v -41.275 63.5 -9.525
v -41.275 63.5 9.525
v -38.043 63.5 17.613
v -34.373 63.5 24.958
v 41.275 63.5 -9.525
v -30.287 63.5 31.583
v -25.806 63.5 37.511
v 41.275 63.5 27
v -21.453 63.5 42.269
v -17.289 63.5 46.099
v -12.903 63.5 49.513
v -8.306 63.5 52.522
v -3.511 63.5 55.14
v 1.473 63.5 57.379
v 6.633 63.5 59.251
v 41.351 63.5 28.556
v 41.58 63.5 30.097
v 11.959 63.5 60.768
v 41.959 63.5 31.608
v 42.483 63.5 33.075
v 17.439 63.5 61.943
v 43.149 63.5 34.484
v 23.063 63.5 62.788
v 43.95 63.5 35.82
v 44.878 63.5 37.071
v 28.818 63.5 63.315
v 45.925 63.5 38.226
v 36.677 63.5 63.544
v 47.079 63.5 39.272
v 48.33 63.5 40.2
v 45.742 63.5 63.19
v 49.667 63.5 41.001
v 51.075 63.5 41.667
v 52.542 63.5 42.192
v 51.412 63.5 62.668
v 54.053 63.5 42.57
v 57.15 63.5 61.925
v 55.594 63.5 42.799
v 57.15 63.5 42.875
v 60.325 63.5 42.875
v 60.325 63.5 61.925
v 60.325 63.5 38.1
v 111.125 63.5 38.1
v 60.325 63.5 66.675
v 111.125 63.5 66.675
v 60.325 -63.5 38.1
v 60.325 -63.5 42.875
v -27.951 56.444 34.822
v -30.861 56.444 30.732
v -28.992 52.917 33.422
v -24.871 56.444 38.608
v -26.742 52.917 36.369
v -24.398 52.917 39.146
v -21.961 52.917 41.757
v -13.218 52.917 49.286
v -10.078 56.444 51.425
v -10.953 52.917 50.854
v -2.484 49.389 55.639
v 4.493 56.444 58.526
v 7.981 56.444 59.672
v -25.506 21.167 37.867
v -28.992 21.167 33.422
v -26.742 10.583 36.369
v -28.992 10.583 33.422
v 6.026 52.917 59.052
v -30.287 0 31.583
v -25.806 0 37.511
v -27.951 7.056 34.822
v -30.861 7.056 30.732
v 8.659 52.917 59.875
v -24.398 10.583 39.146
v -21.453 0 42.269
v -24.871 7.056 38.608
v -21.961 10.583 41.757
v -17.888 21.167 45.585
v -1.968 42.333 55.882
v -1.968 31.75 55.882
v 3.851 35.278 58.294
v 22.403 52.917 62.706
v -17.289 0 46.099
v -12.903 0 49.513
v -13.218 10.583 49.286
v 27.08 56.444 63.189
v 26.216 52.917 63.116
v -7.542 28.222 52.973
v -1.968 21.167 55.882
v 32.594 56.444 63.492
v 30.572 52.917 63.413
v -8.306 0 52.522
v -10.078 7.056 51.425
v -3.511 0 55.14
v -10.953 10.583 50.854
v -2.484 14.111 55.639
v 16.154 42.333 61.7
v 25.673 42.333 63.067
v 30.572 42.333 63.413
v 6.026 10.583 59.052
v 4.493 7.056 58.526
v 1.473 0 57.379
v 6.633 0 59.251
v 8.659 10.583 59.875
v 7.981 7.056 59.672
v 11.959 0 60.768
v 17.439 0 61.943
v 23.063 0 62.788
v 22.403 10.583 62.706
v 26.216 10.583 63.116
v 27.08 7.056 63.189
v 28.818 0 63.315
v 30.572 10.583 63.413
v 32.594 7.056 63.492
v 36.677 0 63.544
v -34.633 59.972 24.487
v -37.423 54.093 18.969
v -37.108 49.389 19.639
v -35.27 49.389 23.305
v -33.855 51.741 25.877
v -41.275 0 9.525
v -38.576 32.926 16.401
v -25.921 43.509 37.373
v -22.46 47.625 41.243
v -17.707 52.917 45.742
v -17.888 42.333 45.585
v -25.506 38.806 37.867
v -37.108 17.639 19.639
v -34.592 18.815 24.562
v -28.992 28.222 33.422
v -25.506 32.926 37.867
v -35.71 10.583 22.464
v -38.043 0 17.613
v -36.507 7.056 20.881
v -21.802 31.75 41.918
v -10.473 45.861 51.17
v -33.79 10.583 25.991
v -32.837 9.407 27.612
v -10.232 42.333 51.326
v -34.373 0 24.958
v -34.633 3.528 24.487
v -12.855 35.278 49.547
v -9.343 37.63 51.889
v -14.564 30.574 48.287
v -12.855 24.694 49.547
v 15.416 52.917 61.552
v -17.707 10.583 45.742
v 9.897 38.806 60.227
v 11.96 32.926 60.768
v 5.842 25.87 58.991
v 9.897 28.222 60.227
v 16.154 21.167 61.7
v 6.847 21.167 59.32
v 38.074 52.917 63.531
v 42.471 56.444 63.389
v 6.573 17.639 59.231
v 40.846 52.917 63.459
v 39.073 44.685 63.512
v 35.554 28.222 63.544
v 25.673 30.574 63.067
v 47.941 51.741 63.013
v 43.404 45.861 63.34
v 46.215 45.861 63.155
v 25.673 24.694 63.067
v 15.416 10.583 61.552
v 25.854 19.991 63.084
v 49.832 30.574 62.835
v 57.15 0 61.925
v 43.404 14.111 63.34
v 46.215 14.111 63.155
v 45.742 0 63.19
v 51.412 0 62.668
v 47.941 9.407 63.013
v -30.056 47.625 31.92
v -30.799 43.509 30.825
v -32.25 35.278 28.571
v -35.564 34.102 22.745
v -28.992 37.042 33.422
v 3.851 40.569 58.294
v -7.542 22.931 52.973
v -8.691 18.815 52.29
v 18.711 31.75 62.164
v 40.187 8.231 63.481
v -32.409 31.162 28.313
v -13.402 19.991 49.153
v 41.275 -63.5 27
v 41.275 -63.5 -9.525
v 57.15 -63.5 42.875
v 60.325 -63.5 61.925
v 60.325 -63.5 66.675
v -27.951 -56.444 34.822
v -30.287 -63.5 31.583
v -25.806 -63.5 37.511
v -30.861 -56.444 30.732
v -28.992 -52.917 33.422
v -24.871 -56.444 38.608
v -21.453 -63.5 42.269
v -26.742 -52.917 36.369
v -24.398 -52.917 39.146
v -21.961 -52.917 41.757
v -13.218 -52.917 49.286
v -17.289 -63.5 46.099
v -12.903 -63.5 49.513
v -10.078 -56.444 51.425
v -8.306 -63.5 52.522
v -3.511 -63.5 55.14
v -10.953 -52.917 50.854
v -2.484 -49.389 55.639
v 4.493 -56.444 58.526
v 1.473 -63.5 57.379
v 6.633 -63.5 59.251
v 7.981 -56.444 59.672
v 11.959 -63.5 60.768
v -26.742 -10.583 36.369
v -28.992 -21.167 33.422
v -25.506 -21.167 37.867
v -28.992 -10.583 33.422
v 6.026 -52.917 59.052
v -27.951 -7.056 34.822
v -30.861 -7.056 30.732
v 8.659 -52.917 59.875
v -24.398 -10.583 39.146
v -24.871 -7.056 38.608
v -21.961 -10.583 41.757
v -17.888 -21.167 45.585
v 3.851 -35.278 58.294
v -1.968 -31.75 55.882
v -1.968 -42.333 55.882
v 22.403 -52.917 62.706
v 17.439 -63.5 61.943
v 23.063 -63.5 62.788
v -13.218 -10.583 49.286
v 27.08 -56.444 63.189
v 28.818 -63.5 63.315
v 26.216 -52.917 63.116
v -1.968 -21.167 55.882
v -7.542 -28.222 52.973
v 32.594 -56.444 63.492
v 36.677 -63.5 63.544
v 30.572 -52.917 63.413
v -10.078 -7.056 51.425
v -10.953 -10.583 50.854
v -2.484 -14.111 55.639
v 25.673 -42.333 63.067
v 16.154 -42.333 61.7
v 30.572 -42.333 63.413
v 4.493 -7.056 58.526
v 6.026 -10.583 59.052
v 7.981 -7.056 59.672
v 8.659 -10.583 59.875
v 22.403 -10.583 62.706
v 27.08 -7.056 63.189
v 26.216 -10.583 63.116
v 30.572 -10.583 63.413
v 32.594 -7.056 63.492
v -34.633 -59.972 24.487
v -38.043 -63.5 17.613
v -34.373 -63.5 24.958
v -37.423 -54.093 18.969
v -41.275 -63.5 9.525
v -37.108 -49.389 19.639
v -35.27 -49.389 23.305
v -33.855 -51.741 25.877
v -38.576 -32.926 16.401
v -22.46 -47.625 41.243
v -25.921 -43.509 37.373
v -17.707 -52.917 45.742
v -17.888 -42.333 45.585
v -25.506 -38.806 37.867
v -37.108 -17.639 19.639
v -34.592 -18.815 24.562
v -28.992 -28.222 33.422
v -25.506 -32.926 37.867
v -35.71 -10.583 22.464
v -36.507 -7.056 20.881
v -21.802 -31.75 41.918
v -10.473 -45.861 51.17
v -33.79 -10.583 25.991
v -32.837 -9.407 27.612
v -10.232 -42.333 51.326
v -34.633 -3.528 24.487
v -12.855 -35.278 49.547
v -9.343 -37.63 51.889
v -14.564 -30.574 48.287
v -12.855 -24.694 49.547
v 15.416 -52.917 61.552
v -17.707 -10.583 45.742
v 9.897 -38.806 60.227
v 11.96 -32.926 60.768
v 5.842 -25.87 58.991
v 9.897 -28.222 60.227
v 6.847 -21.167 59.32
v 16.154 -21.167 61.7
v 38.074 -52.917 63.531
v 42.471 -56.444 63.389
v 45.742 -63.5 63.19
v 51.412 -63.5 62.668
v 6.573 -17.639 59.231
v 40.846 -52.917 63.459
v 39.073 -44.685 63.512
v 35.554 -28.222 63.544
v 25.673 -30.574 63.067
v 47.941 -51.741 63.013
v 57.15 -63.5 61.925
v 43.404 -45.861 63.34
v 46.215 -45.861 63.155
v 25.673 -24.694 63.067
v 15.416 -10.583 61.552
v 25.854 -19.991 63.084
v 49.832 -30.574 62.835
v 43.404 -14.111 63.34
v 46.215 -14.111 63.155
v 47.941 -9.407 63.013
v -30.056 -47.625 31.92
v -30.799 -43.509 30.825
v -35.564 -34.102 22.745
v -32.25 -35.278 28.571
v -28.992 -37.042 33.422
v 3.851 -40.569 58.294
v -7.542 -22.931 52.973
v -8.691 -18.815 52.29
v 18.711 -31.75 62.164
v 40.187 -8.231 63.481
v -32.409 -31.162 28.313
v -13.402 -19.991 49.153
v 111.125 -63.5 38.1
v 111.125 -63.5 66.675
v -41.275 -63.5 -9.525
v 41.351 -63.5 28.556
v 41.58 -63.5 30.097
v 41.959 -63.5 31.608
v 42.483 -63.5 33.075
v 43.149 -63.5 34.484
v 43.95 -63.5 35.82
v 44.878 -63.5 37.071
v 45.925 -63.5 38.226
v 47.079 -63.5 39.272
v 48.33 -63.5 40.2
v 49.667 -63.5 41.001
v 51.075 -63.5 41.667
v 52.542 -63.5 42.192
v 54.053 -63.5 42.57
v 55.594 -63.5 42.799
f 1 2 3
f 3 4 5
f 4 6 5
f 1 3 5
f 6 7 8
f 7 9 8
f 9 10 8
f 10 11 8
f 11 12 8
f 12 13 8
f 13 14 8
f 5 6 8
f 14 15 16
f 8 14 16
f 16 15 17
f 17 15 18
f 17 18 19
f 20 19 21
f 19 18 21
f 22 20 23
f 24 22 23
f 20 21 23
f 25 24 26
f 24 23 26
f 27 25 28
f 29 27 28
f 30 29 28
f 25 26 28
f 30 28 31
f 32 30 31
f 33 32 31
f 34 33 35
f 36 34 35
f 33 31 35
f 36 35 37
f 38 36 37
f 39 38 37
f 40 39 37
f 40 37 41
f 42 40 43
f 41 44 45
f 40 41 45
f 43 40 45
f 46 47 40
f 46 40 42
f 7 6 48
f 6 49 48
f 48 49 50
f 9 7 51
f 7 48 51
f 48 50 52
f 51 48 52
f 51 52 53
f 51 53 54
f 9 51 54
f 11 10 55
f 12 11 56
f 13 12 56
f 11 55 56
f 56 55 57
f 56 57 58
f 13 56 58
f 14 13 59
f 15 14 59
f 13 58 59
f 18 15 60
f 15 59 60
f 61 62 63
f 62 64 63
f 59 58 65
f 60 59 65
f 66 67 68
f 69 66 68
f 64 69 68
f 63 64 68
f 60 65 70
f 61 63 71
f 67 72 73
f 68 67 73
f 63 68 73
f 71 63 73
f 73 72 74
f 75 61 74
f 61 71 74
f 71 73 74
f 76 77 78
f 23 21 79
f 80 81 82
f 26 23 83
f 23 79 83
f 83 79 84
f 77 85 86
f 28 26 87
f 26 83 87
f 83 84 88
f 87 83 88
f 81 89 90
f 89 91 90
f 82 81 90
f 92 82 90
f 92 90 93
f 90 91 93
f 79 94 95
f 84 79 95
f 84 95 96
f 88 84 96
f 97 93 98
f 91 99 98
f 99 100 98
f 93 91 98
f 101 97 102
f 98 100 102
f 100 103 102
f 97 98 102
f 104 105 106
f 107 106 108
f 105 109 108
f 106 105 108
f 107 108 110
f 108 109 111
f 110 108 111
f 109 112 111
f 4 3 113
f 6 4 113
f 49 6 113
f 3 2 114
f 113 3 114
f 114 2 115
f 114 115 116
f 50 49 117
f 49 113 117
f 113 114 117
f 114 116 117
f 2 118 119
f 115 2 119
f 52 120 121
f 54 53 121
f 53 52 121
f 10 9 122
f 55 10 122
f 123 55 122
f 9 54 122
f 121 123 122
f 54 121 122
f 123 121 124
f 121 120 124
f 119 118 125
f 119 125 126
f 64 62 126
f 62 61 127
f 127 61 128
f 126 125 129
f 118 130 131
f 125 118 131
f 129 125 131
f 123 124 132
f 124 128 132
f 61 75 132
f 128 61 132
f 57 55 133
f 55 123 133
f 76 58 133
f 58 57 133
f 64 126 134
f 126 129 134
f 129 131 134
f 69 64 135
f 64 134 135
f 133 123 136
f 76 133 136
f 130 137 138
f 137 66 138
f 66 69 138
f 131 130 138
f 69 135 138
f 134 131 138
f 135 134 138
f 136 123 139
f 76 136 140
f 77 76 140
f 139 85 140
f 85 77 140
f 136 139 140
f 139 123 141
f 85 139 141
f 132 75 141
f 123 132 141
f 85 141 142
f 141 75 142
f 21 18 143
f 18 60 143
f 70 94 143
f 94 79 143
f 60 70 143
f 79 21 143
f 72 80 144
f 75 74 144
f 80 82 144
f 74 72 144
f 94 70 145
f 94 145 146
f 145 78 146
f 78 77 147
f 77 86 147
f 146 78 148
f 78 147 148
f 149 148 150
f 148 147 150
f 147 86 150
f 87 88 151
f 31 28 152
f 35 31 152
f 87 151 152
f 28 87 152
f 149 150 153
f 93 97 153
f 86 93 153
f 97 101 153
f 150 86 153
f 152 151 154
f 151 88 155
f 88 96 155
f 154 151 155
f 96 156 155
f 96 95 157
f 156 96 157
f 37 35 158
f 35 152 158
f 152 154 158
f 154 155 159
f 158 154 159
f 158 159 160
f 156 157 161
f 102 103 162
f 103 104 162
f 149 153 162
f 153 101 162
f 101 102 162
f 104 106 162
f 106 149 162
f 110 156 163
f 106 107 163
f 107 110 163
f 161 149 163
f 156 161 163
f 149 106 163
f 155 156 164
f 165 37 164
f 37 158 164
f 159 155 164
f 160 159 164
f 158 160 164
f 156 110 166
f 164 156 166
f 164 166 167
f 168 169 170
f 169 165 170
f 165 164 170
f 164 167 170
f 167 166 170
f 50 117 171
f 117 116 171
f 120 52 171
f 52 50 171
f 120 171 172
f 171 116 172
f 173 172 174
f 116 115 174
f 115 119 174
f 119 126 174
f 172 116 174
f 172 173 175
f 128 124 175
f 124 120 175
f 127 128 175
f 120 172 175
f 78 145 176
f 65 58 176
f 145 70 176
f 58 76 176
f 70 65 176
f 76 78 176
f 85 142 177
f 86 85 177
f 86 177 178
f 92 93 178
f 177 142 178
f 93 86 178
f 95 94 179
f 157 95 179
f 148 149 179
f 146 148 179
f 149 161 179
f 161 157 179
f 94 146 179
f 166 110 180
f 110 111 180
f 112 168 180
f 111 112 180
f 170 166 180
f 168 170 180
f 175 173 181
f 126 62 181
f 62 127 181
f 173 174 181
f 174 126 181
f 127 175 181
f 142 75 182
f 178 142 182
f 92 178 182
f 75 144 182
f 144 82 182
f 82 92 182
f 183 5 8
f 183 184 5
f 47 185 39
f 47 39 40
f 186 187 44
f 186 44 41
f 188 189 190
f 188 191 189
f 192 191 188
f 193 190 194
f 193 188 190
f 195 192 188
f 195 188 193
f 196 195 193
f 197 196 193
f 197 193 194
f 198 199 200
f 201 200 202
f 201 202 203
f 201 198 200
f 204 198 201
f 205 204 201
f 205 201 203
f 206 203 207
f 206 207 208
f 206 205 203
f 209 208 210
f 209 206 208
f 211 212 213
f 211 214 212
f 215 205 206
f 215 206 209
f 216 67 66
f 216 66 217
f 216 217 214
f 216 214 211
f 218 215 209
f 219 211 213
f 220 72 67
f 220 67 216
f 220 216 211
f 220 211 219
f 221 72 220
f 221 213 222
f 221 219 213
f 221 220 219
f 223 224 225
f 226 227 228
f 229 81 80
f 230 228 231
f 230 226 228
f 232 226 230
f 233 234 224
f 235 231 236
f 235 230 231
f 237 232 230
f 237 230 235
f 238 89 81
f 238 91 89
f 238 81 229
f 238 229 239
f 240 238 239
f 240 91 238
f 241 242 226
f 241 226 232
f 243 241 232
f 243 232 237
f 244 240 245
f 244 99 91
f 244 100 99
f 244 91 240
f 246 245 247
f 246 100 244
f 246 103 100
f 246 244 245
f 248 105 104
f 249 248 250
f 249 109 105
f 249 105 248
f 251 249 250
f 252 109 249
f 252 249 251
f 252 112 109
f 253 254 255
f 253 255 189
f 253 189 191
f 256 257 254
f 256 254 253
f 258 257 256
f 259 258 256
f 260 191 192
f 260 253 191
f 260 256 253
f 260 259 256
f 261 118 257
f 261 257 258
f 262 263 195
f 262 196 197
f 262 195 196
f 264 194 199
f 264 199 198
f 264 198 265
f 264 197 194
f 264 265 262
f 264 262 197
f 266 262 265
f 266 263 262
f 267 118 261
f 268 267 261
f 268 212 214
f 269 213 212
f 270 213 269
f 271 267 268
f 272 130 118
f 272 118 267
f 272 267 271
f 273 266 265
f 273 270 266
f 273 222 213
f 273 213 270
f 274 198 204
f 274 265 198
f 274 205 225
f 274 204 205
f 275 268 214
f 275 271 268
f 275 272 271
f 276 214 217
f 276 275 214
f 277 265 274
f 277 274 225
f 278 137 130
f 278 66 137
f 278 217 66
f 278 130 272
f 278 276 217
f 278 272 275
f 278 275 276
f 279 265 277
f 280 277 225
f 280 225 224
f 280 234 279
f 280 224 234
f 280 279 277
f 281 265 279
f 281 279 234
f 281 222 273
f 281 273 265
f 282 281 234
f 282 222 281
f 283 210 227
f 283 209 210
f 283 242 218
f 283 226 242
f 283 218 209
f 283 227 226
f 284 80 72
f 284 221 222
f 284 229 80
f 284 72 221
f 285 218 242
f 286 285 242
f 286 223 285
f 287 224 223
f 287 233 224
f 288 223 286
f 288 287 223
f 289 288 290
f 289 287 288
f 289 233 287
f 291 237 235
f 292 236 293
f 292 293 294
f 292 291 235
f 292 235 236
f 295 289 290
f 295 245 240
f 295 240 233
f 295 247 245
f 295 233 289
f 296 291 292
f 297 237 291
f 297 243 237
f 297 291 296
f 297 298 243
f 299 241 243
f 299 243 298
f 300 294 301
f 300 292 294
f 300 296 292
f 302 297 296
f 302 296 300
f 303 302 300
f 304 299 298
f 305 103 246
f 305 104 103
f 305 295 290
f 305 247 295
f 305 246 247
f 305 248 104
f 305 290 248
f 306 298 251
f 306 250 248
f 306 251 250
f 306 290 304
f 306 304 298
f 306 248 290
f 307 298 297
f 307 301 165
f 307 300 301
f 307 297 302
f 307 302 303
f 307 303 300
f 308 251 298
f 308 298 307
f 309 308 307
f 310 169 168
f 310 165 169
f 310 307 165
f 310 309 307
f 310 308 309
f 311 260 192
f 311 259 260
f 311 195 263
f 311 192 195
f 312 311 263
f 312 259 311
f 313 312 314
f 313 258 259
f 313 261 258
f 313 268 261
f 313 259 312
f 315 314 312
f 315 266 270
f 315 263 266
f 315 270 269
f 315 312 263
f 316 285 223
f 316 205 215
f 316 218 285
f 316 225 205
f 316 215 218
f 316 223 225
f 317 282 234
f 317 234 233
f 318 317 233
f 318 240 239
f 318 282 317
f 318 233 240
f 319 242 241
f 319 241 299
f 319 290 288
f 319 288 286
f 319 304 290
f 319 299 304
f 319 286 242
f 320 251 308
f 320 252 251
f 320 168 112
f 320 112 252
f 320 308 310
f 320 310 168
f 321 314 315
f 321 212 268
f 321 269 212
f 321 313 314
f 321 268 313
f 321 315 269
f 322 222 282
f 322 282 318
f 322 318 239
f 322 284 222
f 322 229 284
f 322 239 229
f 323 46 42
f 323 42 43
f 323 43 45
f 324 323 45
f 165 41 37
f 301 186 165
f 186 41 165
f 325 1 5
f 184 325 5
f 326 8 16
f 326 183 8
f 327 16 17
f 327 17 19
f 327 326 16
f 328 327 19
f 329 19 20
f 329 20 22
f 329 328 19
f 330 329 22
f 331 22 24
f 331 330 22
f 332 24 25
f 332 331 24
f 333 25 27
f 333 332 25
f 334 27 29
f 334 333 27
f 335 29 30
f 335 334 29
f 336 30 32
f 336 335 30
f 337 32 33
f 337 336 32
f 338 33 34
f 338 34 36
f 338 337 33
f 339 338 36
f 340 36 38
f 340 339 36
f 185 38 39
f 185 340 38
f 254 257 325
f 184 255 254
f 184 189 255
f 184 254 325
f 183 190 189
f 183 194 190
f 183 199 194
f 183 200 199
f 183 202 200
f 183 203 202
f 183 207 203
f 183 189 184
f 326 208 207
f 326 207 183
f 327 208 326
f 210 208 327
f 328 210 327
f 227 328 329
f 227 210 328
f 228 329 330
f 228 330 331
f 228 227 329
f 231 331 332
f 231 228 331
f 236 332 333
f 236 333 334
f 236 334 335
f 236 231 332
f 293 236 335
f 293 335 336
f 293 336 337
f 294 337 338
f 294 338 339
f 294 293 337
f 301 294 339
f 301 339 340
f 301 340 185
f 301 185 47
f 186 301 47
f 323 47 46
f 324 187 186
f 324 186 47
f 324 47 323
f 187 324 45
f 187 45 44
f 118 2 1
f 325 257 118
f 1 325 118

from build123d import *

# Parameters (mm, degrees)
F0_W     = 20.1580673288
F0_H     = 19.05
F1_DEPTH = 63.5


with BuildPart() as f1:
    # F0 (on Front) → F1 (new body, symmetric)
    with BuildSketch(Plane.XZ):
        with BuildLine():
            Line((22.225, 9.525), (41.275, 9.525))
            Line((41.275, 9.525), (41.275, 27.0002))
            ThreePointArc((41.275, 27.0002), (45.9246798487, 38.2255201513), (57.15, 42.8752))
            Line((57.15, 42.8752), (60.325, 42.8752))
            Line((60.325, 42.8752), (60.325, 61.9252))
            Line((60.325, 61.9252), (57.15, 61.9252))
            ThreePointArc((57.15, 61.9252), (32.4542956671, 51.6959043329), (22.225, 27.0002))
            Line((22.225, 27.0002), (22.225, 9.525))
        make_face()
        with BuildLine():
            add(Edge.make_bspline(
                [(-41.275, 9.525), (-24.4504585862, 56.9105558097), (13.9114698395, 68.2926625013), (57.15, 61.9252)],
                knots=[0, 0, 0, 0, 111.5045361635, 111.5045361635, 111.5045361635, 111.5045361635], degree=3))
            Line((-41.275, 9.525), (22.225, 9.525))
            Line((22.225, 9.525), (22.225, 27.0002))
            ThreePointArc((22.225, 27.0002), (32.4542956671, 51.6959043329), (57.15, 61.9252))
        make_face()
        with Locations((70.4040336644, 52.4002)):
            Rectangle(F0_W, F0_H)
        Polygon((60.325, 66.675), (60.325, 61.9252), (80.4830673288, 61.9252), (80.4830673288, 42.8752), (60.325, 42.8752), (60.325, 38.1), (111.125, 38.1), (111.125, 66.675), align=None)
        Polygon((-41.275, 9.525), (-41.275, -9.525), (41.275, -9.525), (41.275, 9.525), (22.225, 9.525), align=None)
    extrude(amount=F1_DEPTH, both=True)


solid = f1.part
